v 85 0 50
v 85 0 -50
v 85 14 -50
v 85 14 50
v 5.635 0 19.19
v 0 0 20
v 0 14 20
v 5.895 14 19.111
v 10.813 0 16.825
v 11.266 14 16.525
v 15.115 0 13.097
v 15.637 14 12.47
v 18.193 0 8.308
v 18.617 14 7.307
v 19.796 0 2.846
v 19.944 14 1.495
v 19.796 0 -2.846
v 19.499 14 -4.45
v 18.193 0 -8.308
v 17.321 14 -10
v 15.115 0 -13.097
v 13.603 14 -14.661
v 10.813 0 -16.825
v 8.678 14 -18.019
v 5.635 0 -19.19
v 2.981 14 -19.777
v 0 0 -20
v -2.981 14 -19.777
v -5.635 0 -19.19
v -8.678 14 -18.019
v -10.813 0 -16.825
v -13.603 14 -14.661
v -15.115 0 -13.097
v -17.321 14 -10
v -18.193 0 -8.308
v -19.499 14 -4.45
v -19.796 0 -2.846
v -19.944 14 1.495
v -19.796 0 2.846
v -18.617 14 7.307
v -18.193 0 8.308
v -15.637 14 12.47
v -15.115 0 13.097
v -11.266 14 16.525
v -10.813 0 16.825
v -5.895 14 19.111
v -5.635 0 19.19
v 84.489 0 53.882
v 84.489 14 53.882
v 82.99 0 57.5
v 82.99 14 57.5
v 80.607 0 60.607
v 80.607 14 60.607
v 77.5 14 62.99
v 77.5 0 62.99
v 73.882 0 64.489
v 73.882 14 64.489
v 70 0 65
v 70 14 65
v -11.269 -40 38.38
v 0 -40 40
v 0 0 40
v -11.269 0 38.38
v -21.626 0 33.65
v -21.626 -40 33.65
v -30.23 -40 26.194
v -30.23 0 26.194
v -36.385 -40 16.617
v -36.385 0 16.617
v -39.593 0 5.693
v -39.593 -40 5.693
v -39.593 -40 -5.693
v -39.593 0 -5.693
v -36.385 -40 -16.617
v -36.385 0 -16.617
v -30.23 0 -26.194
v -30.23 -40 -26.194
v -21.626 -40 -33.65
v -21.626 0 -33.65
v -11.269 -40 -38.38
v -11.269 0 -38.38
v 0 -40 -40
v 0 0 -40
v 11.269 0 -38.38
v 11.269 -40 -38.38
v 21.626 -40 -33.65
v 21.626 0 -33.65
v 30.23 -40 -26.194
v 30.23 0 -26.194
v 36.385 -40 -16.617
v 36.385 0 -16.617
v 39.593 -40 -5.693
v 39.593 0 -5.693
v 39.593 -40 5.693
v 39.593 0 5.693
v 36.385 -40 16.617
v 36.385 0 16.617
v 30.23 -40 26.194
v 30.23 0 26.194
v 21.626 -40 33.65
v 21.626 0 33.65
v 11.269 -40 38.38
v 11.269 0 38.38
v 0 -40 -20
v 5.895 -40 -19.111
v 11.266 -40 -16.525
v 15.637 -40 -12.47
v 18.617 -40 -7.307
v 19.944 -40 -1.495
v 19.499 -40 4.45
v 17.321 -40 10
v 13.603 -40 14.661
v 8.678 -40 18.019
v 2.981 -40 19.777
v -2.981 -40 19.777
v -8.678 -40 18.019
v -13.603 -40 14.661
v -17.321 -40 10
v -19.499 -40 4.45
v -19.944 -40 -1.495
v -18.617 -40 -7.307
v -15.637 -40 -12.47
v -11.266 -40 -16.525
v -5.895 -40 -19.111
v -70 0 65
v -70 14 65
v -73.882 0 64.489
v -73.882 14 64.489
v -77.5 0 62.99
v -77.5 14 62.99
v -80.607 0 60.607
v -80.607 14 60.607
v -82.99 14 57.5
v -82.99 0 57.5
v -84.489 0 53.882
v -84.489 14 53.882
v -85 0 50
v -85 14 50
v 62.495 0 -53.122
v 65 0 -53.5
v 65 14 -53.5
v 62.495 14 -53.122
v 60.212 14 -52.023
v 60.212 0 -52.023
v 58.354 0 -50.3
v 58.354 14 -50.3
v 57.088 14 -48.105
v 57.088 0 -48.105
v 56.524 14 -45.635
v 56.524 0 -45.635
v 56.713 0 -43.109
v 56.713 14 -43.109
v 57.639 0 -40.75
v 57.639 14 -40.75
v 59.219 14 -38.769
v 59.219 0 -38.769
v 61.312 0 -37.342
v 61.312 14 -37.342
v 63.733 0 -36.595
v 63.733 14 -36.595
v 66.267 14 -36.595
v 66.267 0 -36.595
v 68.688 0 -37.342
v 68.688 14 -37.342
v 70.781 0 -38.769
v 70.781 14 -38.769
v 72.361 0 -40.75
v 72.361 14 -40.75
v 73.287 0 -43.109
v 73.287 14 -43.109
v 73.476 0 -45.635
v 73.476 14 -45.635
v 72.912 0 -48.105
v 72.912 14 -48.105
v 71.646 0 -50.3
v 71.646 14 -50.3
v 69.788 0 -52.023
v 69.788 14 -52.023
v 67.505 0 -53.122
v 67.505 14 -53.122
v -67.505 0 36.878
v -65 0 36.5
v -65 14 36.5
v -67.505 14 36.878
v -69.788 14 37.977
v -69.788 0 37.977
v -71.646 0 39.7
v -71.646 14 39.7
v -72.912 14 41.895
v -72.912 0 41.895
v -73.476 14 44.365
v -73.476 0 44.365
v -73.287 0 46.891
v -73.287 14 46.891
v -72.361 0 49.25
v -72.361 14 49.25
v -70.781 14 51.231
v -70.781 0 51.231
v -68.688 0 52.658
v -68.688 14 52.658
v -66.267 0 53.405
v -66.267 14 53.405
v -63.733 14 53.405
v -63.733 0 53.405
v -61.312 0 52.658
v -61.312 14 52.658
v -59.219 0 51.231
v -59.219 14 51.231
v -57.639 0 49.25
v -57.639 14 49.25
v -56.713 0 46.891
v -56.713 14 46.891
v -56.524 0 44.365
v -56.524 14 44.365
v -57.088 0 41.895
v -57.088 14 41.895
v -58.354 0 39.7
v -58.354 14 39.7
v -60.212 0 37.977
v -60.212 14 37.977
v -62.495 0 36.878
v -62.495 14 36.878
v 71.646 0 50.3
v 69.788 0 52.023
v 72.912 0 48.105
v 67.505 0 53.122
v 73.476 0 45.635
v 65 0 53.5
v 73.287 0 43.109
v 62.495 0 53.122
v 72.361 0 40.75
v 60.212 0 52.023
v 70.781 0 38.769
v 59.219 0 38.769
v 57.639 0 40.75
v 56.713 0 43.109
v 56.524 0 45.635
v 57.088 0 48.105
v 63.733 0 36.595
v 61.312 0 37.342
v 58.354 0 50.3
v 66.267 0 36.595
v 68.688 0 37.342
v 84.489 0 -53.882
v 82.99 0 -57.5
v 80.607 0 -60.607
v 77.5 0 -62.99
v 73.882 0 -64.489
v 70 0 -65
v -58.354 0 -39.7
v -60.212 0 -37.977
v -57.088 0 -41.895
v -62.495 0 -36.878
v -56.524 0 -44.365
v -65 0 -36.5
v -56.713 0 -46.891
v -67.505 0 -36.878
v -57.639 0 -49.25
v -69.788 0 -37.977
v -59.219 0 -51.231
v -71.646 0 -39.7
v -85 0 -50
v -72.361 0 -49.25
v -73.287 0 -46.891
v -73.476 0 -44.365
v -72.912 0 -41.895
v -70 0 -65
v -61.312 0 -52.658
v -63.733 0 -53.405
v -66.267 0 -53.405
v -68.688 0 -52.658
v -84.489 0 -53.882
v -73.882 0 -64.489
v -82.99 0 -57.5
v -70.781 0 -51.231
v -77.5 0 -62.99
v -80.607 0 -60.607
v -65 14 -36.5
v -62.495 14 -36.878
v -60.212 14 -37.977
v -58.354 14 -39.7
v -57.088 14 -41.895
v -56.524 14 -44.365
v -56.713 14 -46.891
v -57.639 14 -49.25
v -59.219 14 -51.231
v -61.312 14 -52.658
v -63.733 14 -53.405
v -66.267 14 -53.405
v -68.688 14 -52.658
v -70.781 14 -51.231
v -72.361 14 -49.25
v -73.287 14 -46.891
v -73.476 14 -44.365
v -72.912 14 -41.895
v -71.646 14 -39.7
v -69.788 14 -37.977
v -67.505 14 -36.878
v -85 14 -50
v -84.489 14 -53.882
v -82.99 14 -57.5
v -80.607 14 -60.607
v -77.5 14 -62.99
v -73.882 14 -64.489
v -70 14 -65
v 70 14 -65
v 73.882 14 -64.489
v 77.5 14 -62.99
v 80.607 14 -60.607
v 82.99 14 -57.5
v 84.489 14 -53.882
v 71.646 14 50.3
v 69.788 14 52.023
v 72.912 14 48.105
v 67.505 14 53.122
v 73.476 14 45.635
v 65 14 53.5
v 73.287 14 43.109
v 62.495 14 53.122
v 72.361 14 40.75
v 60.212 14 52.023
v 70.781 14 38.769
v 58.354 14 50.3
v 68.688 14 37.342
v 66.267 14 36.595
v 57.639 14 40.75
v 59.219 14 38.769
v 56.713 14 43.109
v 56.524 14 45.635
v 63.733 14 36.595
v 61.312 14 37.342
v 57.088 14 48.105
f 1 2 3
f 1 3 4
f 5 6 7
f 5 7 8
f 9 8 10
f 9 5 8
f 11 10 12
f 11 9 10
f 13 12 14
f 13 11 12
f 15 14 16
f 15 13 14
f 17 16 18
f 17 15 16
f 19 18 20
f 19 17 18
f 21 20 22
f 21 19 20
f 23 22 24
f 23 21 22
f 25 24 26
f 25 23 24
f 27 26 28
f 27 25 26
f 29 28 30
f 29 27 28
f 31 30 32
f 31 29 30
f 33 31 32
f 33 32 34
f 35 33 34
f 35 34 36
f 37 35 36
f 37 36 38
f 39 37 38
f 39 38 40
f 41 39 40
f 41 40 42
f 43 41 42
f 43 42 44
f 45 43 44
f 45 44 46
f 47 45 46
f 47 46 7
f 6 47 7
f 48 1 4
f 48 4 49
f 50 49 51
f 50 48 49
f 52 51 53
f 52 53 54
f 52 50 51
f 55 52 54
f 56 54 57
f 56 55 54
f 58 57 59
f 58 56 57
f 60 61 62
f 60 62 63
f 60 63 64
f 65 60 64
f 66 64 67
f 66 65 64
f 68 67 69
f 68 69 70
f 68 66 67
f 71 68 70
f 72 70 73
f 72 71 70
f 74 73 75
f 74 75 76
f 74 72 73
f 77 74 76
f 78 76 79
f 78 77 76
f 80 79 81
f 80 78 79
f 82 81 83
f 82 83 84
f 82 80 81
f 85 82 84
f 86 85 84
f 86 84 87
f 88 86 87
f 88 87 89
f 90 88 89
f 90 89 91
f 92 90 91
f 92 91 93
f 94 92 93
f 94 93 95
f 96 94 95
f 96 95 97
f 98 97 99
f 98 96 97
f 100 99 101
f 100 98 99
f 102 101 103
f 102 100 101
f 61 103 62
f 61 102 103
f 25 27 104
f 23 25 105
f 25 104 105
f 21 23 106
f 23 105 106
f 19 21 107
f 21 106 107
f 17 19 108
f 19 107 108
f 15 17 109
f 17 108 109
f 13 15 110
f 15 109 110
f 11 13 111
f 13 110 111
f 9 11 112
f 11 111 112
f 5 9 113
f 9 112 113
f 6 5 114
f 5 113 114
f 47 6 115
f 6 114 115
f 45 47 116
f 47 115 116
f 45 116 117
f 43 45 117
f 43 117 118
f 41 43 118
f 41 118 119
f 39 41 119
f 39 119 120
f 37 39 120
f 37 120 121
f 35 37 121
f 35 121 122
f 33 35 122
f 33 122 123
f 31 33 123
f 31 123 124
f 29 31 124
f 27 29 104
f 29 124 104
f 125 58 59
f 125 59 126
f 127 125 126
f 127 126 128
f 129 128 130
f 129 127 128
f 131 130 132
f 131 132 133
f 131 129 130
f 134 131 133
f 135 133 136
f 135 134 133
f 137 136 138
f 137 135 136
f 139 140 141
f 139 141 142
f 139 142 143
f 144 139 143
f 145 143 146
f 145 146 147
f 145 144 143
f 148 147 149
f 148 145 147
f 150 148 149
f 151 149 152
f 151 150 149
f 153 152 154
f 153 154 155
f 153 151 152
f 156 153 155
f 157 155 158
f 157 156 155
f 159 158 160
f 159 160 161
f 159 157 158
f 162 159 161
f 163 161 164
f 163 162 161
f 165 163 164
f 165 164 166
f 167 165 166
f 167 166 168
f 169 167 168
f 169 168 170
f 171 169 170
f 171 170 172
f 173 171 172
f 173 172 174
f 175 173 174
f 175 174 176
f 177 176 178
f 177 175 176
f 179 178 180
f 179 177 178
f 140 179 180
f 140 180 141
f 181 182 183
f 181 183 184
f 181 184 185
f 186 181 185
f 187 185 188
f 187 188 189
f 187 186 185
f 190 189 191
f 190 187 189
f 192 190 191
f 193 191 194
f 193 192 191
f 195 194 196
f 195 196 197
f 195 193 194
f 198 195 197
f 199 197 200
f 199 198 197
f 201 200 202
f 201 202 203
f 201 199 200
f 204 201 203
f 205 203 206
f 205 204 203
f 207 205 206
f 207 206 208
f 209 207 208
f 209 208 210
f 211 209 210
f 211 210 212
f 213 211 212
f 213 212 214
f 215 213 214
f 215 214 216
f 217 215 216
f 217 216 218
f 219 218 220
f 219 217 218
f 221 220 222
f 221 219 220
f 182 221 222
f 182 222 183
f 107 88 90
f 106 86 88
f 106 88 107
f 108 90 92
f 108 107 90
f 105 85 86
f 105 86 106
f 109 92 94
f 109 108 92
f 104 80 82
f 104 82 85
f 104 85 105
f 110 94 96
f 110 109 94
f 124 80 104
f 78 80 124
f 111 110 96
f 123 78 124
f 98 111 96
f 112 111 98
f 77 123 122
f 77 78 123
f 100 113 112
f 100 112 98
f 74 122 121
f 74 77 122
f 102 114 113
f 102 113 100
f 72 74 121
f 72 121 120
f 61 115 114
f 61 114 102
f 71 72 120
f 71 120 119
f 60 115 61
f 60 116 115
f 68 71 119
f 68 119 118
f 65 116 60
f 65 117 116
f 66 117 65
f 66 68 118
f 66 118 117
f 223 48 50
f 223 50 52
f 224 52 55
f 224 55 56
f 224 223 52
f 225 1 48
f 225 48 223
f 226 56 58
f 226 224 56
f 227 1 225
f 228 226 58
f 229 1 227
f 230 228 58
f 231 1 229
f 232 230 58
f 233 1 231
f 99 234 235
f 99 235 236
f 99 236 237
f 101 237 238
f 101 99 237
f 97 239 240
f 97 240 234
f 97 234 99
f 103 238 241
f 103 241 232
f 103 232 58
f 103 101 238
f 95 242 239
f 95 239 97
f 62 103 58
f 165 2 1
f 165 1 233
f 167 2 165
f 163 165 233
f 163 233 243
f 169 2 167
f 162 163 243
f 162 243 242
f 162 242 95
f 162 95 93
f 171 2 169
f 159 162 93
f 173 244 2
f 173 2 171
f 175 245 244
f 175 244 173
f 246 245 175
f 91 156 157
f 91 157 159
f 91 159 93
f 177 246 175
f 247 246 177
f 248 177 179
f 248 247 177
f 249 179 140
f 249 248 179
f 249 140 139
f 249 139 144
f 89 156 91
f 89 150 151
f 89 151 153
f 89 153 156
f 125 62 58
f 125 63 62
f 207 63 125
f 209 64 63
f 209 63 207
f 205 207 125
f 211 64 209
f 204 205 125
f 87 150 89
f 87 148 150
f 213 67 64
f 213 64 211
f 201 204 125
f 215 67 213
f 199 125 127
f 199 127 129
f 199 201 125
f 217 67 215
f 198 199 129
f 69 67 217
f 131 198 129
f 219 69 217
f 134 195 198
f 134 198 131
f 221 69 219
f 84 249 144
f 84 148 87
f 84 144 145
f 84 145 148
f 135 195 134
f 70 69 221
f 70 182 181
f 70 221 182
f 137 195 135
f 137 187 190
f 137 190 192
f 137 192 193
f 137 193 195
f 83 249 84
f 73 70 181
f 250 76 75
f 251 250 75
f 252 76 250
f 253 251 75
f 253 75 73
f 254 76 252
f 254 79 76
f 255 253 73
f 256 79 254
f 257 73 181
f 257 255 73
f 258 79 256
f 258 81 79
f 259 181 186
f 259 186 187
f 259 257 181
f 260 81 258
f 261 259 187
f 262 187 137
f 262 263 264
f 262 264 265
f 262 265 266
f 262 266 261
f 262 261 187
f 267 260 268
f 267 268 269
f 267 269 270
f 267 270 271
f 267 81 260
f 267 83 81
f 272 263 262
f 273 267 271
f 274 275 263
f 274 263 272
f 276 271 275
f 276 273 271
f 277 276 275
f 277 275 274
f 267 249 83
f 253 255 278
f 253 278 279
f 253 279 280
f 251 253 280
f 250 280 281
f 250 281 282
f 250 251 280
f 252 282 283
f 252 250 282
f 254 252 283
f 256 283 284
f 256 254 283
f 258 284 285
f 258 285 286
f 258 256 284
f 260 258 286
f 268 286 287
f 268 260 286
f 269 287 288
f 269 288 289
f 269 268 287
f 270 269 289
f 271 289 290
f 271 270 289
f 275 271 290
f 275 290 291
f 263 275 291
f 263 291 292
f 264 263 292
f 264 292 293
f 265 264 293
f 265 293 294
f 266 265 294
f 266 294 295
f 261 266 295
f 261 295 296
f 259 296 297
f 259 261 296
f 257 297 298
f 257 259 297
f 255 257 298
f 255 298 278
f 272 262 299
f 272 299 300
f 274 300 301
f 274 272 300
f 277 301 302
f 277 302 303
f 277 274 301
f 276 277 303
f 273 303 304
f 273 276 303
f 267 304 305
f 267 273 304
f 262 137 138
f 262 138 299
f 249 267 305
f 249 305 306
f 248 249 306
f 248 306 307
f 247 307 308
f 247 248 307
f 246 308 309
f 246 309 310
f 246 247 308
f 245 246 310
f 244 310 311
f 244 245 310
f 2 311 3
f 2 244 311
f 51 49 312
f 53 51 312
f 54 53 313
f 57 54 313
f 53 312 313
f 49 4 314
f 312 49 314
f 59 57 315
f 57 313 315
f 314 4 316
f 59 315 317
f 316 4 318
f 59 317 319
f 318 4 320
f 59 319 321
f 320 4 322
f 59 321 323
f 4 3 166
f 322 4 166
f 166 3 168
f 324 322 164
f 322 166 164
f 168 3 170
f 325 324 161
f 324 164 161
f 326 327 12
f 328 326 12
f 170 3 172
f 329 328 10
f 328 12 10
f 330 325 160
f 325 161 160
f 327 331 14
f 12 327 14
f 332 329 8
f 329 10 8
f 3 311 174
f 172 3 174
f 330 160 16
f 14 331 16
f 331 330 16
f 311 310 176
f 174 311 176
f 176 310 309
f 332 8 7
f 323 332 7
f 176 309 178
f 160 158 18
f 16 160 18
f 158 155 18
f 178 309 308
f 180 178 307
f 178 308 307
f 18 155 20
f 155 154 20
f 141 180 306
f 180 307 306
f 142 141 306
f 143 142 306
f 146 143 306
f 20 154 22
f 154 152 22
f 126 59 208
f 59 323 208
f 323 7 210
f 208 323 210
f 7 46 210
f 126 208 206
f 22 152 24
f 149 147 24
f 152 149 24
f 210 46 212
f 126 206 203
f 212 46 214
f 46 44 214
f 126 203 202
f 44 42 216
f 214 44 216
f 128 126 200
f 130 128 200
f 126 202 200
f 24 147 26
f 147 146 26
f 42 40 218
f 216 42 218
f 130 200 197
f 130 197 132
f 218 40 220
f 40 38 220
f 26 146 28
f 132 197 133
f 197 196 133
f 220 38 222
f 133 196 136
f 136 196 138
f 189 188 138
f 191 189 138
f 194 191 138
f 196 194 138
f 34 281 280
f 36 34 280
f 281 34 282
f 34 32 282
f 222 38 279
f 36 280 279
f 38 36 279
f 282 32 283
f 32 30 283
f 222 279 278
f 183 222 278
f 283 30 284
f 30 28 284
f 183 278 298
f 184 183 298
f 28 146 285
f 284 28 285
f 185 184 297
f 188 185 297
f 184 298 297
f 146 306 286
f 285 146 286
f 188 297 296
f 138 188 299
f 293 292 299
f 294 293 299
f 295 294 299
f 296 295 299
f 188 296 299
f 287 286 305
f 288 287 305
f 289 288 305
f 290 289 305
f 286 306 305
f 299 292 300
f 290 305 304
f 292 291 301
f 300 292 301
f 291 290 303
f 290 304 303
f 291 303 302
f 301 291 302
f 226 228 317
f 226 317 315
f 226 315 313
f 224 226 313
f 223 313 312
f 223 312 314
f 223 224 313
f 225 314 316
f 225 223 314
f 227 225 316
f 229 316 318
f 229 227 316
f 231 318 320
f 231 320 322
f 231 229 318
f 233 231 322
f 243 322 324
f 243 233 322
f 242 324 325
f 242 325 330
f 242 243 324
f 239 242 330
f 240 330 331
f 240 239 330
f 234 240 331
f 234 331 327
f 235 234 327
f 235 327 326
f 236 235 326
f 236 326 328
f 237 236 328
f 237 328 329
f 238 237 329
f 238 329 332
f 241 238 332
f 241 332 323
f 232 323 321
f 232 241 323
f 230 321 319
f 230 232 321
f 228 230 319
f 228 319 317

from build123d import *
from build123d.topology import SkipClean

# Parameters (mm, degrees)
SCHIZZO1_R                   = 20
SCHIZZO1_R_2                 = 8.5
ESTRUSIONE_ESTRUSIONE1_DEPTH = 14
ESTRUSIONE_ESTRUSIONE2_START = 40
SCHIZZO2_R                   = 40
SCHIZZO2_R_2                 = 20
ESTRUSIONE_ESTRUSIONE2_DEPTH = 40


with BuildPart() as part:
    # Schizzo1 → Estrusione-Estrusione1 (new body)
    with BuildSketch(Plane(origin=(0, 0, 0), x_dir=(1, 0, 0), z_dir=(0, 1, 0))):
        with BuildLine():
            Line((-70, 65), (70, 65))
            ThreePointArc((70, 65), (80.606601718, 60.606601718), (85, 50))
            Line((85, 50), (85, -50))
            ThreePointArc((85, -50), (80.606601718, -60.606601718), (70, -65))
            Line((70, -65), (-70, -65))
            ThreePointArc((-70, -65), (-80.606601718, -60.606601718), (-85, -50))
            Line((-85, -50), (-85, 50))
            ThreePointArc((-85, 50), (-80.606601718, 60.606601718), (-70, 65))
        make_face()
        with Locations(Location((0, 0, 0), (0, 0, 270))):
            Circle(SCHIZZO1_R, mode=Mode.SUBTRACT)
        with Locations(Location((65, -45, 0), (0, 0, 270))):
            Circle(SCHIZZO1_R_2, mode=Mode.SUBTRACT)
        with Locations(Location((65, 45, 0), (0, 0, 90))):
            Circle(SCHIZZO1_R_2, mode=Mode.SUBTRACT)
        with Locations(Location((-65, -45, 0), (0, 0, 90))):
            Circle(SCHIZZO1_R_2, mode=Mode.SUBTRACT)
        with Locations(Location((-65, 45, 0), (0, 0, 270))):
            Circle(SCHIZZO1_R_2, mode=Mode.SUBTRACT)
    extrude(amount=ESTRUSIONE_ESTRUSIONE1_DEPTH)

    # Schizzo2 → Estrusione-Estrusione2 (add)
    with SkipClean():  # the faces are left unmerged after this step: merging them gives an invalid solid
        with BuildSketch(Plane.XZ.offset(ESTRUSIONE_ESTRUSIONE2_START)):
            with Locations(Location((0, 0, 0), (0, 0, 90))):
                Circle(SCHIZZO2_R)
            with Locations(Location((0, 0, 0), (0, 0, 270))):
                Circle(SCHIZZO2_R_2, mode=Mode.SUBTRACT)
        extrude(amount=-ESTRUSIONE_ESTRUSIONE2_DEPTH)


solid = part.part
